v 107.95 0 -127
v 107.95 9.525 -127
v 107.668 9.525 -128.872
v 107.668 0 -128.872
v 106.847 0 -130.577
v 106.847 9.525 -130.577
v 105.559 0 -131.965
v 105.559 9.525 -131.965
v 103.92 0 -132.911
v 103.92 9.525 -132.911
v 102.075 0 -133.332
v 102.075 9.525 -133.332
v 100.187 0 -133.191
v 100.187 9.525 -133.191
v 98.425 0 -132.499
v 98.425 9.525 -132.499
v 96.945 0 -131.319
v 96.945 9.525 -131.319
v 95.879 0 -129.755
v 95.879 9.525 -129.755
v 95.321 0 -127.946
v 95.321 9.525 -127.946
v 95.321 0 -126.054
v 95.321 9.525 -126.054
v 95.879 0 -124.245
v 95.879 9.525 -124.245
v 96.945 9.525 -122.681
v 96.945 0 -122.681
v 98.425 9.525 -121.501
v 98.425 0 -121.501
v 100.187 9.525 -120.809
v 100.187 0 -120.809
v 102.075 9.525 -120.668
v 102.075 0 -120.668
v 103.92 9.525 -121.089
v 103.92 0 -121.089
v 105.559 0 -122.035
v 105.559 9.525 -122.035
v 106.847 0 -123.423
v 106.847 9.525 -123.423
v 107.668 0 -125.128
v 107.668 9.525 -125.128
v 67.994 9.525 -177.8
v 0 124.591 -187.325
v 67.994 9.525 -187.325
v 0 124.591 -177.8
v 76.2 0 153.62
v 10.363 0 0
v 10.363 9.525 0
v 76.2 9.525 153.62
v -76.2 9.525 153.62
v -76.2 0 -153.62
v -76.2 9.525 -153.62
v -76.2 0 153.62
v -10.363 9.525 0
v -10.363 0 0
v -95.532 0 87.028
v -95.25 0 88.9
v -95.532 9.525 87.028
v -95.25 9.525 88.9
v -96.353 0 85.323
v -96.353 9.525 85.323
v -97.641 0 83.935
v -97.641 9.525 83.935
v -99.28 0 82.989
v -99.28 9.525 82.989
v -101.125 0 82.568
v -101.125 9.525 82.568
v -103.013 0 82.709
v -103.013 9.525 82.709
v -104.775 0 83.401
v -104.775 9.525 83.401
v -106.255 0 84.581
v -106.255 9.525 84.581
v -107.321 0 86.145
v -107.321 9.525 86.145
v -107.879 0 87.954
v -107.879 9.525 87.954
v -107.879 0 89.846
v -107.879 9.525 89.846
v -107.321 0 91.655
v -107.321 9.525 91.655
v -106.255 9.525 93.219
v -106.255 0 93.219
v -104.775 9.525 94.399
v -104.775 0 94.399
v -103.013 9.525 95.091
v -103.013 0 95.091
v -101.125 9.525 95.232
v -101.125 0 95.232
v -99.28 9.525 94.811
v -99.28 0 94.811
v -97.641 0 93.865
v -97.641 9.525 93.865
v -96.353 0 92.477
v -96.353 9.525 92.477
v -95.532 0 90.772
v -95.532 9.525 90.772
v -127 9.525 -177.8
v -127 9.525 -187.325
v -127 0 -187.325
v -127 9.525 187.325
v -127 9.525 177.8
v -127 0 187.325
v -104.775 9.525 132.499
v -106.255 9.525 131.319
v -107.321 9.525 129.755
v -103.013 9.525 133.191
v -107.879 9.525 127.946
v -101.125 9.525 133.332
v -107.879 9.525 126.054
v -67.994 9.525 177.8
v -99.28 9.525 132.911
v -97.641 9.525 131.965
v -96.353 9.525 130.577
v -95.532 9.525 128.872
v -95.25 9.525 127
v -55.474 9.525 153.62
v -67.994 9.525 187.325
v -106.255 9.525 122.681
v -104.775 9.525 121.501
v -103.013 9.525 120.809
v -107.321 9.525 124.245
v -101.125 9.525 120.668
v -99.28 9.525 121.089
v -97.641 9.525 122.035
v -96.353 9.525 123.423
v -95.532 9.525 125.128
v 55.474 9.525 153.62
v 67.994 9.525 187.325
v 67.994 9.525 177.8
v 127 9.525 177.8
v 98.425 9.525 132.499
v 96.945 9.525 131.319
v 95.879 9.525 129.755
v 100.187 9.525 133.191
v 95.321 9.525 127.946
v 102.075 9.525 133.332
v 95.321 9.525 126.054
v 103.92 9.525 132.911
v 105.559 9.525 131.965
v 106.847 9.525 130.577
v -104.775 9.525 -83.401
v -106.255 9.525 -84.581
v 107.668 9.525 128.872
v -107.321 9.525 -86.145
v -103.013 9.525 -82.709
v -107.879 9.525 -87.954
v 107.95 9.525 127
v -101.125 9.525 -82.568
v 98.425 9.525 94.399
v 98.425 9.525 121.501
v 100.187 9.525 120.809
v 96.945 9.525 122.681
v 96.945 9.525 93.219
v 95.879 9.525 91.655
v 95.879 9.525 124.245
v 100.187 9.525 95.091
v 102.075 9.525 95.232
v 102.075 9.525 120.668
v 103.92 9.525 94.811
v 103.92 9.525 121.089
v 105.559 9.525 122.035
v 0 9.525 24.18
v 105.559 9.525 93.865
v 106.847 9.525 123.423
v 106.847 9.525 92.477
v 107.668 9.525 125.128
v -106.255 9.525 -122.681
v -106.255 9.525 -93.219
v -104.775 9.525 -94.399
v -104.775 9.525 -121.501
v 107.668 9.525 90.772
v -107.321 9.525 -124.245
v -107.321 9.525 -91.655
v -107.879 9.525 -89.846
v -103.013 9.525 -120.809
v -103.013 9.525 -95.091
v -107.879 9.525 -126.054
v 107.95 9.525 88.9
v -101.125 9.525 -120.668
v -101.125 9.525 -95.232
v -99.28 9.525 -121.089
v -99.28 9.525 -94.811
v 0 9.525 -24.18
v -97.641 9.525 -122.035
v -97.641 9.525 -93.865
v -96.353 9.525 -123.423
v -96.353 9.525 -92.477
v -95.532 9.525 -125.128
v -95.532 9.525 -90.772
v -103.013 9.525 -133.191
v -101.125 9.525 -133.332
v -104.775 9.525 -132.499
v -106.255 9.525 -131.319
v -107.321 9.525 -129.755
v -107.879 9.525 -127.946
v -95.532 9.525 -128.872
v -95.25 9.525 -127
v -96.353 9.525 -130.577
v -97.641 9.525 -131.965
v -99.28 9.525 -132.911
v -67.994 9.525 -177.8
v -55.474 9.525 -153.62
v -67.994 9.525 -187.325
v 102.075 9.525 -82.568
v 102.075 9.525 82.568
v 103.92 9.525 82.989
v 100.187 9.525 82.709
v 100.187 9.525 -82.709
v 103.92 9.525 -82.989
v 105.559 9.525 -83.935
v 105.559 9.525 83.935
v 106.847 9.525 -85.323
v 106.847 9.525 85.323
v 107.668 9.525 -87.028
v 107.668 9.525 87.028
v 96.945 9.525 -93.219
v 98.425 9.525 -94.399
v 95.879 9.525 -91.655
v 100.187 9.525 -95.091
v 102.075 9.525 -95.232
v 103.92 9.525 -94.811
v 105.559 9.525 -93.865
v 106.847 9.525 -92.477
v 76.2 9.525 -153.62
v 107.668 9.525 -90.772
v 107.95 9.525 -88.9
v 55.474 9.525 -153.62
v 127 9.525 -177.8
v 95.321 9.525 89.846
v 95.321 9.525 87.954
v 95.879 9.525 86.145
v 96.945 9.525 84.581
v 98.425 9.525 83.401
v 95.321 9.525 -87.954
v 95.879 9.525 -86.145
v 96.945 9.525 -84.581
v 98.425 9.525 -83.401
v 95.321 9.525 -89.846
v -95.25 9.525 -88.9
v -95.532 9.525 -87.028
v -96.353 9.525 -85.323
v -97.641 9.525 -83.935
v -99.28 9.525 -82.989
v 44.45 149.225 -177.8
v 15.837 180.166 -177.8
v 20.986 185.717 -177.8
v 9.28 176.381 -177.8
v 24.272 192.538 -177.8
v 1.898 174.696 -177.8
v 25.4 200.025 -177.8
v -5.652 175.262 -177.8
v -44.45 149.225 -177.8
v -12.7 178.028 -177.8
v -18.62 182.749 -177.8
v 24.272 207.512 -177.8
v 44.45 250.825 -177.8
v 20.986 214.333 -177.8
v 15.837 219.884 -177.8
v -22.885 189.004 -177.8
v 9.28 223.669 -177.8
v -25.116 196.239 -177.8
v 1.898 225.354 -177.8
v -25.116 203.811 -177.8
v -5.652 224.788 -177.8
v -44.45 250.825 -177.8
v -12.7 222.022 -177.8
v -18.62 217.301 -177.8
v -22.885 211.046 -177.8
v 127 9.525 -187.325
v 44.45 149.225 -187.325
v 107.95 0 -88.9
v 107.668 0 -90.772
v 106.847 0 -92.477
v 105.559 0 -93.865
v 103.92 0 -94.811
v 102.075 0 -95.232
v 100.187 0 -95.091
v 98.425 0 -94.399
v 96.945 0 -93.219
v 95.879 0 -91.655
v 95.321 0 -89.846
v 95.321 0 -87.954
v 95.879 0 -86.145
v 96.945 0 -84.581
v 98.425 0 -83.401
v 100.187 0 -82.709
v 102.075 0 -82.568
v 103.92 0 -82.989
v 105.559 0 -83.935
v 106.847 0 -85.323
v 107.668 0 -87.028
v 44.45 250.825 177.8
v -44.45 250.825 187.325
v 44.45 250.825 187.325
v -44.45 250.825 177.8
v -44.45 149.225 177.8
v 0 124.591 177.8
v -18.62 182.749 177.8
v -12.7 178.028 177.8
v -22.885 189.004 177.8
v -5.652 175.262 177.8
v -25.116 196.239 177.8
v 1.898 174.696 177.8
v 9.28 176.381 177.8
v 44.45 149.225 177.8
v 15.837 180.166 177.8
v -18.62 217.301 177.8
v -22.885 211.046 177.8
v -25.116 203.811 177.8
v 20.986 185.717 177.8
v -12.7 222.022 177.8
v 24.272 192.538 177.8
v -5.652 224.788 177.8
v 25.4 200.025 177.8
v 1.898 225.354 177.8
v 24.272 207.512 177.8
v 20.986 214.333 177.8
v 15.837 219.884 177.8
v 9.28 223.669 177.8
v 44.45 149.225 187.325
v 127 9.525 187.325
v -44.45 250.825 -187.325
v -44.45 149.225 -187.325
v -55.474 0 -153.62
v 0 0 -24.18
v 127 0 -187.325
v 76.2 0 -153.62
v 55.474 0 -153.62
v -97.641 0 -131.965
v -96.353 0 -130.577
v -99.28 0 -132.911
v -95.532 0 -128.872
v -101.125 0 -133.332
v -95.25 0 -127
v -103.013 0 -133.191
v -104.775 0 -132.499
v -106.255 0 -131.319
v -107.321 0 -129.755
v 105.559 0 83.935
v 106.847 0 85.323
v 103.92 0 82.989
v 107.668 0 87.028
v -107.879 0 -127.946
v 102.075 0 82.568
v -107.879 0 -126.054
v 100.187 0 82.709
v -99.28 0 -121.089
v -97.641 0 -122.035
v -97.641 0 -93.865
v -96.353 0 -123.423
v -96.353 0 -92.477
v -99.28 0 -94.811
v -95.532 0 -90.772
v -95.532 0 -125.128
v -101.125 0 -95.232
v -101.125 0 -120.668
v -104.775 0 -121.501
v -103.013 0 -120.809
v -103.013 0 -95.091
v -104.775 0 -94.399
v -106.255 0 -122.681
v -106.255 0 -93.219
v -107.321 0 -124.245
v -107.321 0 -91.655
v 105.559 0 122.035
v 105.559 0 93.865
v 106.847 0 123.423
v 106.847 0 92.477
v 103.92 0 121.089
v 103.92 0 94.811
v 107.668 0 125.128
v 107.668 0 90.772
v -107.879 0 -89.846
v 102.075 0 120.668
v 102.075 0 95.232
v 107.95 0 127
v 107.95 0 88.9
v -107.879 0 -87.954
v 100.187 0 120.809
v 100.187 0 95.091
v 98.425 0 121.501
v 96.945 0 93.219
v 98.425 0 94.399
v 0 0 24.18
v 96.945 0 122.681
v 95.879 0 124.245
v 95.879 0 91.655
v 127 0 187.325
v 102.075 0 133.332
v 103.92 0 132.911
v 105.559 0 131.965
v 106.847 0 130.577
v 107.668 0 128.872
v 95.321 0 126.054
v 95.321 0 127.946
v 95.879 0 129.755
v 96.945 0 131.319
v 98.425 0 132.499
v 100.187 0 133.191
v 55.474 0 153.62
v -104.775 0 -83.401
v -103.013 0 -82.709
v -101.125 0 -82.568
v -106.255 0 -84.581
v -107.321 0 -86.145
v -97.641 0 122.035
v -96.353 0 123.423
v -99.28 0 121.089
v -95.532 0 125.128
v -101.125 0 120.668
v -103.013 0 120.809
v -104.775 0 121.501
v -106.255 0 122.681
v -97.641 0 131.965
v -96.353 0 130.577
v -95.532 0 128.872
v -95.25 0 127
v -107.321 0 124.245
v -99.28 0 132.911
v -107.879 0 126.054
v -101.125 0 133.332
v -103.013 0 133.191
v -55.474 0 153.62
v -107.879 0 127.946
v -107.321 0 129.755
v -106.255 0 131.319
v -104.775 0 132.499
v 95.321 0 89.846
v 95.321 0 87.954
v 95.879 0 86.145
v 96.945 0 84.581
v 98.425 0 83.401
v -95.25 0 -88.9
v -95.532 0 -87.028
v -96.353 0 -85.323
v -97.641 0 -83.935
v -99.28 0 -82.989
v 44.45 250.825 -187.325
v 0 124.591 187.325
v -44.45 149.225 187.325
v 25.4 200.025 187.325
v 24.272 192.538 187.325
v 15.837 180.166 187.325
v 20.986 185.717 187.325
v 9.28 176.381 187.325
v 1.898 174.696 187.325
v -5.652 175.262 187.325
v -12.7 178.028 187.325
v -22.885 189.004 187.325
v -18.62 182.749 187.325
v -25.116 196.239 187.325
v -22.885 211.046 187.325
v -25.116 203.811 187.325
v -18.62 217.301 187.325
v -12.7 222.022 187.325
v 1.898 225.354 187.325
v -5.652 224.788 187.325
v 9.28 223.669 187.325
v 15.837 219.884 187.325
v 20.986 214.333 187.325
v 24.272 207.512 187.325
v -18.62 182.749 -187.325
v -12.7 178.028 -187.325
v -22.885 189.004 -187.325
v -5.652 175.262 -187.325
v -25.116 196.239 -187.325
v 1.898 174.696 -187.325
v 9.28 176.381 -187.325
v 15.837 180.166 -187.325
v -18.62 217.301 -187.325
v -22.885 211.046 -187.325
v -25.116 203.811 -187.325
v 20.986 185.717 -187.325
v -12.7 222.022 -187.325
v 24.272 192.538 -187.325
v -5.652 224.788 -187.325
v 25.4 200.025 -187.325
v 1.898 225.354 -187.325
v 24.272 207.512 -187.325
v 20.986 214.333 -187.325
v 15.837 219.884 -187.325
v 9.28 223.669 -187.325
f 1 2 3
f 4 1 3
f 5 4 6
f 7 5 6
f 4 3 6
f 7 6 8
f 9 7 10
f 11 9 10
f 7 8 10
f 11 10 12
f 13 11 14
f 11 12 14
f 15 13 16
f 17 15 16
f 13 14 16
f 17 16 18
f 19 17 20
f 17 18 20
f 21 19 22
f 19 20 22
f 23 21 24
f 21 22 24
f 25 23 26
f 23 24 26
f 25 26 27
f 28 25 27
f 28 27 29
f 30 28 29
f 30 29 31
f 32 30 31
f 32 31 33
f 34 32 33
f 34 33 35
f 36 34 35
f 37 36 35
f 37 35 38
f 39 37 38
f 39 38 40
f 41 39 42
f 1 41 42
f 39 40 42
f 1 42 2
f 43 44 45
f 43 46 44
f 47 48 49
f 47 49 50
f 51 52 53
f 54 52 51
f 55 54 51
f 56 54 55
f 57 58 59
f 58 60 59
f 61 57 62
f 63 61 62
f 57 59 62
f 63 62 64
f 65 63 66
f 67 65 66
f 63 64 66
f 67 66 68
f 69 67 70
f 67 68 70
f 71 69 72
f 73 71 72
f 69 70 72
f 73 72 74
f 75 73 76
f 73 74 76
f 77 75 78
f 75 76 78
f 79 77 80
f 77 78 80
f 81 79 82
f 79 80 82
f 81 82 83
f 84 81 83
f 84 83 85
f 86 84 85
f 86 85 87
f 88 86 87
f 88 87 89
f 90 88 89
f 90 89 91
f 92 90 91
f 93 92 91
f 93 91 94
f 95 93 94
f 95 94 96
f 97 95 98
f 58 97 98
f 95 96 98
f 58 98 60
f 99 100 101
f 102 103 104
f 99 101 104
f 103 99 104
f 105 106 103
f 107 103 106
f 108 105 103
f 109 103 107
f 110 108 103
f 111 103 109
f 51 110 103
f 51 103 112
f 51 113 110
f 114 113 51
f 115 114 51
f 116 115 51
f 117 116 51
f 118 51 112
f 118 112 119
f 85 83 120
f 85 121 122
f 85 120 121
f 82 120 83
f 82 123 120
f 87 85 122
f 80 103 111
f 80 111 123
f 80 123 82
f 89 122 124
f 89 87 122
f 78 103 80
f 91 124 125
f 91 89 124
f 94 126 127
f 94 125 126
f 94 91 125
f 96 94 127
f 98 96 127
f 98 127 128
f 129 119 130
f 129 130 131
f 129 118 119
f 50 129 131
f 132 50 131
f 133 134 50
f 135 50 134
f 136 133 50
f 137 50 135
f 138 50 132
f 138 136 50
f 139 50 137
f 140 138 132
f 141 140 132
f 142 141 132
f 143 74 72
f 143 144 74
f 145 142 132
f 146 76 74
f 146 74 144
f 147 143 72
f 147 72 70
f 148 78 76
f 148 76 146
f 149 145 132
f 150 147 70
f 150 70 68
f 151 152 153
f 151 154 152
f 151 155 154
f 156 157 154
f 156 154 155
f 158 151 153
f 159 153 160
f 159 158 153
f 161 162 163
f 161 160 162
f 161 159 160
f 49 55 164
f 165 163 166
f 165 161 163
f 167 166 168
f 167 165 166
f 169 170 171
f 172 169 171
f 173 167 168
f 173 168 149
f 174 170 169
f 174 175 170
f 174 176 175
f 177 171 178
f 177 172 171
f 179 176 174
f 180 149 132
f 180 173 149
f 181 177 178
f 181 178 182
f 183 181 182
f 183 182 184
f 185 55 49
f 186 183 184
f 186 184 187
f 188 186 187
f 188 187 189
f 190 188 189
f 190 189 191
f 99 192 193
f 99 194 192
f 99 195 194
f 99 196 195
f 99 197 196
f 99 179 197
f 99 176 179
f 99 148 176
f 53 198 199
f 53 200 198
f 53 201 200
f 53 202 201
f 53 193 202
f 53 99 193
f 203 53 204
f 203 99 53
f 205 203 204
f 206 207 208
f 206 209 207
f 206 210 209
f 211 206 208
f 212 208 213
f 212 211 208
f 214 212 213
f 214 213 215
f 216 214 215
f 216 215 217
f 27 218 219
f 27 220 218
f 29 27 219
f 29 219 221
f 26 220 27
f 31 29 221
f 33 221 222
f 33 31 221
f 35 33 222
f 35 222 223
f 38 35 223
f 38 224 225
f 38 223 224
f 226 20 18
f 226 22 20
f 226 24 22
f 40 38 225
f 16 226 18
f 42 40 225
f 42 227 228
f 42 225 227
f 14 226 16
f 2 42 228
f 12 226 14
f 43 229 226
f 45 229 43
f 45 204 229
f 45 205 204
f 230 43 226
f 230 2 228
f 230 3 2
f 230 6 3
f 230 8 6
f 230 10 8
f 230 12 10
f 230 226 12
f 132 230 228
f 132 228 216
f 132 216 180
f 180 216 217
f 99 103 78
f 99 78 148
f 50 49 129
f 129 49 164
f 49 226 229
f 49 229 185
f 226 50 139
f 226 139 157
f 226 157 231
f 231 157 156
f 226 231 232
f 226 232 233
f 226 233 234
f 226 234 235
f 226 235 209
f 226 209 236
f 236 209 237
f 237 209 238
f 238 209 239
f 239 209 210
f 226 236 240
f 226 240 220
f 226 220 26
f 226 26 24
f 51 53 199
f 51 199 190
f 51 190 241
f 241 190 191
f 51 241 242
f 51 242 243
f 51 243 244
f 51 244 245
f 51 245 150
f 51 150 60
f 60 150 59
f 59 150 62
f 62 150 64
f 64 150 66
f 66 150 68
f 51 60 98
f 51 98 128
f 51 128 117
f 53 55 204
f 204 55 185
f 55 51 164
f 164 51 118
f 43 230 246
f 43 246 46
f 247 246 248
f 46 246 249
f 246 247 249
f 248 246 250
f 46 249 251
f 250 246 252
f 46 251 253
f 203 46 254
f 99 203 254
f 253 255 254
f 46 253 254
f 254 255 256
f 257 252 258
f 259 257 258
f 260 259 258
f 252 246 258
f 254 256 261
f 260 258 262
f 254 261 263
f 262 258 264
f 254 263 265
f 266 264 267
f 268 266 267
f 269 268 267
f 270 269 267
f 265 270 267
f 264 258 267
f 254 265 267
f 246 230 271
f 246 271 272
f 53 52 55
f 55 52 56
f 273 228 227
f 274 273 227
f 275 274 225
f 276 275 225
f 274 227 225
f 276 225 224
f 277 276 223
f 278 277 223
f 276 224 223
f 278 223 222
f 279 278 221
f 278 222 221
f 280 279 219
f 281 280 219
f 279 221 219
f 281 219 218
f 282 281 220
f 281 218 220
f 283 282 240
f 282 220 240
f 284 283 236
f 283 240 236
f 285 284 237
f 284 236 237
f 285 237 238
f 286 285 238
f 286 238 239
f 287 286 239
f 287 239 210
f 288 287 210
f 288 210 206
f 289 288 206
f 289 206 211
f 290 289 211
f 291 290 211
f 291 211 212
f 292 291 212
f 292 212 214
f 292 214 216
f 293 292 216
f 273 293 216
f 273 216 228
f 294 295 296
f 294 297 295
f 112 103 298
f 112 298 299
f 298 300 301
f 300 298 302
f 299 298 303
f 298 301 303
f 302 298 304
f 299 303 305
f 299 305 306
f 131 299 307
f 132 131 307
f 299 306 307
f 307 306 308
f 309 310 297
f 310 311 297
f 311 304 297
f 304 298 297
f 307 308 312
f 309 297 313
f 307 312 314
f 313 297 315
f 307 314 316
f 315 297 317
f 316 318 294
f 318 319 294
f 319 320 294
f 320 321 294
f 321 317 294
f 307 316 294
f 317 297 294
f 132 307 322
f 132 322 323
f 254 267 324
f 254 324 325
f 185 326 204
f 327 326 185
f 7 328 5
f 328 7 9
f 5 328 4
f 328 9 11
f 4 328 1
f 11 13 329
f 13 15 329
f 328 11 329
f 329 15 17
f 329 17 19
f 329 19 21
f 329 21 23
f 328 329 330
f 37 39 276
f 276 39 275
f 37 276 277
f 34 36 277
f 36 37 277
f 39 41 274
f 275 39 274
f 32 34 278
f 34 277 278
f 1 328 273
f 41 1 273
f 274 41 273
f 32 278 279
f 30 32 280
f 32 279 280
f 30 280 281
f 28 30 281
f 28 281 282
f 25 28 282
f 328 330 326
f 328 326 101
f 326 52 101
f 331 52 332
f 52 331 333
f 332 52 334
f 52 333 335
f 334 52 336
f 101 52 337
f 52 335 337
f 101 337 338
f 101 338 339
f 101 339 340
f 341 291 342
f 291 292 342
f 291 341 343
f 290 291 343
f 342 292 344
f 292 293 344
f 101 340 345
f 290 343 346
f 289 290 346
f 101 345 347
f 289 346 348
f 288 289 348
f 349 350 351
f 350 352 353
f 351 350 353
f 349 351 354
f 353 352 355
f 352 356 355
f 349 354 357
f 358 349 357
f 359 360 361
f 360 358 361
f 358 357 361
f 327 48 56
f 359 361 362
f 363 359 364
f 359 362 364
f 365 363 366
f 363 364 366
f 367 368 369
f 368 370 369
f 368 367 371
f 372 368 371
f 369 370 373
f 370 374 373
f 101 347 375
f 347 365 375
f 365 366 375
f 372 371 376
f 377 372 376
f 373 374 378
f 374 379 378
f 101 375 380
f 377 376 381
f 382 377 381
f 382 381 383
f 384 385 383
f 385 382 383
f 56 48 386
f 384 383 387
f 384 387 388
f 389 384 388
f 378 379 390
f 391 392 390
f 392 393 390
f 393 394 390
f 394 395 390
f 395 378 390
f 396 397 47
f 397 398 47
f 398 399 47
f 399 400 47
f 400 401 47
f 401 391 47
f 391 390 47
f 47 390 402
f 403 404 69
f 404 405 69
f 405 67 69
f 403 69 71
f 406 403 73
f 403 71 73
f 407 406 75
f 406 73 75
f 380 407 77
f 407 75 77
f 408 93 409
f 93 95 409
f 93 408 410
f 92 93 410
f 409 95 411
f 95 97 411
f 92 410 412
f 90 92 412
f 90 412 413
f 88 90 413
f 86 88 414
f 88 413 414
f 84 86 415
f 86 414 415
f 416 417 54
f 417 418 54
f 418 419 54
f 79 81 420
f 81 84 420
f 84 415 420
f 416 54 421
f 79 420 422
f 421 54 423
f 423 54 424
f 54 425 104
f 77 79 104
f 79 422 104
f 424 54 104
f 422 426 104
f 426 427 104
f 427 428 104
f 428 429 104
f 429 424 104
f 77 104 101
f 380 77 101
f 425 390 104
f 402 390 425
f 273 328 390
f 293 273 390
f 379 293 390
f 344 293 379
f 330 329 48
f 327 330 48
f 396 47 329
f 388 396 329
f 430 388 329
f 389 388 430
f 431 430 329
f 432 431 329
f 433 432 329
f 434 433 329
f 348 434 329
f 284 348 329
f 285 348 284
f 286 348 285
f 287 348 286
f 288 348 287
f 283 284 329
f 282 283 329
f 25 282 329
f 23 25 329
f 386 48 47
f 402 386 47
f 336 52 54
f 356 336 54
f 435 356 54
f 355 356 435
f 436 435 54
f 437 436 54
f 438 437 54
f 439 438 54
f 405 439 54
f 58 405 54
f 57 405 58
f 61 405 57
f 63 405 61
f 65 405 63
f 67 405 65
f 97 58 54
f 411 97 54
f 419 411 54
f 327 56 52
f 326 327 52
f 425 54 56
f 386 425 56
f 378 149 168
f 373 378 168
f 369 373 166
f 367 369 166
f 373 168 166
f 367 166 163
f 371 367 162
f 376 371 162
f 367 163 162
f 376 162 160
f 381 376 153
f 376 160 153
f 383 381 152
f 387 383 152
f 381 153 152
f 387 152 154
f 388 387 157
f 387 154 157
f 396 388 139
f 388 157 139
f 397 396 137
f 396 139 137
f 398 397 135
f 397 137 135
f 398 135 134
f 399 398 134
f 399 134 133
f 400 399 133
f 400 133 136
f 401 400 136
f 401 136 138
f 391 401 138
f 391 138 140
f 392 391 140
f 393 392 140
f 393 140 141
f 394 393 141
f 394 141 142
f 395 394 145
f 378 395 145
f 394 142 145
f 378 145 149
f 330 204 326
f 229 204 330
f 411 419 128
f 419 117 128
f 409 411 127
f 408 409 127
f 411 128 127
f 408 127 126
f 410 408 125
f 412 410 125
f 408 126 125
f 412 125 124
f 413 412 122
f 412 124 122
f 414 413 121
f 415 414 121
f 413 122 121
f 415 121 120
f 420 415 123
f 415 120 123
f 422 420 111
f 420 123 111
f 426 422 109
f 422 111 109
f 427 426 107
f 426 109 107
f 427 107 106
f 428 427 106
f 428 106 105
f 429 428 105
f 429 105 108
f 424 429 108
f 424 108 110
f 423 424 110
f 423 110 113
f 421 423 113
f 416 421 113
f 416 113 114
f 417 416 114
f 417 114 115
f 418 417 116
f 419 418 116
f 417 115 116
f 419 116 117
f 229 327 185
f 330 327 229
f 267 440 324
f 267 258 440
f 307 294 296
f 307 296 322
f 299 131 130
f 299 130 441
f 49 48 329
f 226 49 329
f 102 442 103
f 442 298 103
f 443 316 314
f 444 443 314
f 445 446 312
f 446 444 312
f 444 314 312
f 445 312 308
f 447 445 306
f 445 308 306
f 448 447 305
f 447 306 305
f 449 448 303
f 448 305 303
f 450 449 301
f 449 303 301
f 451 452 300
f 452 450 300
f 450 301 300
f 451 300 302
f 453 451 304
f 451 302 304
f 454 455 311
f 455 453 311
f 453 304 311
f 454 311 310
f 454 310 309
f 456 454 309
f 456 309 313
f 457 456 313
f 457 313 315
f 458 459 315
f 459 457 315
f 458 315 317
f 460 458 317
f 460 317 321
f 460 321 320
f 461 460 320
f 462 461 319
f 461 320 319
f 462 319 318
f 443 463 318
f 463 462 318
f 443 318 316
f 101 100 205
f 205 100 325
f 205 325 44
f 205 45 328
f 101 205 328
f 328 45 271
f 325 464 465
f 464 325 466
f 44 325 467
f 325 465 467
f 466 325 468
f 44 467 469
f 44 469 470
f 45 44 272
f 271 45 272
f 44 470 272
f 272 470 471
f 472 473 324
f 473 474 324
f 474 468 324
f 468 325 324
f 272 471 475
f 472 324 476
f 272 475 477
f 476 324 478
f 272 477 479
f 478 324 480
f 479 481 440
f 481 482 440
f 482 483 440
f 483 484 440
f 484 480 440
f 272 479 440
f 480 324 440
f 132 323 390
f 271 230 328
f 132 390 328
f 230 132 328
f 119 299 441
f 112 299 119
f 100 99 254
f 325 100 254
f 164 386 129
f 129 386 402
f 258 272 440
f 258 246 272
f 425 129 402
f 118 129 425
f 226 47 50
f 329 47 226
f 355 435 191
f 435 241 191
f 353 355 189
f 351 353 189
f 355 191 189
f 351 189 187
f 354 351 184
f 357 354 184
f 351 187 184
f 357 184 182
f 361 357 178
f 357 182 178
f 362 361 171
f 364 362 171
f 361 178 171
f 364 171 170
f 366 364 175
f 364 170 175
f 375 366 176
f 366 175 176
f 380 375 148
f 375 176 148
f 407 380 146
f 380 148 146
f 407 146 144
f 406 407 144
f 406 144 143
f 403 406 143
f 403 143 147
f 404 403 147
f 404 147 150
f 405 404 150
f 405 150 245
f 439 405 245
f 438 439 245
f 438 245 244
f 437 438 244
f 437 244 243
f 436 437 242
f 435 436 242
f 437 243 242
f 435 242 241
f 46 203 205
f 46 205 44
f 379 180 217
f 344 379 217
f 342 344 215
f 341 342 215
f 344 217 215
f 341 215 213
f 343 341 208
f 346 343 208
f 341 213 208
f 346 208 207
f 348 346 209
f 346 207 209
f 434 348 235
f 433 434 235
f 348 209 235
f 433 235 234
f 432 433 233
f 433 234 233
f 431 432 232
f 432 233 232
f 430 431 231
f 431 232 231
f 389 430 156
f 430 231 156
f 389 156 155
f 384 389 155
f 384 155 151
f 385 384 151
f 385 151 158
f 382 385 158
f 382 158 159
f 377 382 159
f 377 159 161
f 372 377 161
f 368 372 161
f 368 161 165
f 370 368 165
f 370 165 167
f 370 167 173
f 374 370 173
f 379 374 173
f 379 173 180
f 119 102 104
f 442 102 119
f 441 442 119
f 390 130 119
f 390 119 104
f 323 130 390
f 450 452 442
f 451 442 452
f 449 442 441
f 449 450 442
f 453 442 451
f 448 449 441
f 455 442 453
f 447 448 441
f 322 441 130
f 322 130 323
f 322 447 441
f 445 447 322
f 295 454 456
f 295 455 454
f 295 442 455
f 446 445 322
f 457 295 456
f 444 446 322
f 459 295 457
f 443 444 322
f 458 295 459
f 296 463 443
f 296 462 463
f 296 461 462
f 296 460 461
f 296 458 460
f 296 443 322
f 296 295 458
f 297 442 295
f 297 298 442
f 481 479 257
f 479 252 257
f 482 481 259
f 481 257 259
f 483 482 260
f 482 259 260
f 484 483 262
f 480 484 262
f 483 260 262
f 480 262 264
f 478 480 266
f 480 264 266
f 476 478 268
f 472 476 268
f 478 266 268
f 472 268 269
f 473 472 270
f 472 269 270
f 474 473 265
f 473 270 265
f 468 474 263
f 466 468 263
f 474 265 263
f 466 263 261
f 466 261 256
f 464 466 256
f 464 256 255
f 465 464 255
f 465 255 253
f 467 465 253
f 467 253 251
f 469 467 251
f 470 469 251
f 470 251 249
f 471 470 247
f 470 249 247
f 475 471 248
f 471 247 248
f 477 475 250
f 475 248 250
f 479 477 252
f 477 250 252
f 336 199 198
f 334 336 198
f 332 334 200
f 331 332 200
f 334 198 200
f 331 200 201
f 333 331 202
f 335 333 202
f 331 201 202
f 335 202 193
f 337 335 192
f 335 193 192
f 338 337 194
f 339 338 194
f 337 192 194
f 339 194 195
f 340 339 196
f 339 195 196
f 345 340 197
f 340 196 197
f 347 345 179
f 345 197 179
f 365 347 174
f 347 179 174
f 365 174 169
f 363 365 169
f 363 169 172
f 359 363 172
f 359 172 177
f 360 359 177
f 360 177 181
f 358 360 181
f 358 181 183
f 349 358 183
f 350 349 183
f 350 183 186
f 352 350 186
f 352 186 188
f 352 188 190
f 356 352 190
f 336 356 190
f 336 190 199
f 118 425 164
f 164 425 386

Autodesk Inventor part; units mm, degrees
ref_plane "YZ Plane" through (0, 0, 0) normal (1, 0, 0) x (0, 1, 0)
ref_plane "XZ Plane" through (0, 0, 0) normal (0, 1, 0) x (-1, 0, 0)
sketch "Sketch1" plane through (0, 0, 0) normal (0, 1, 0) x (-1, 0, 0)
  line L0 (-127, 228.6) -> (-127, -228.6)
  line L1 (-65.8371, -177.8) -> (65.8371, -177.8)
  line L2 (127, -228.6) -> (127, 228.6)
  line L3 (65.8371, 177.8) -> (-65.8371, 177.8)
  line L4 (127, -228.6) -> (-127, -228.6)
  line L5 (-127, 228.6) -> (127, 228.6)
  line L6 (-76.2, 153.6199) -> (-76.2, -153.6199)
  line L7 (76.2, -153.6199) -> (76.2, 153.6199)
  line L8 (76.2, -153.6199) -> (10.3629, 0)
  line L9 (0, 24.1801) -> (-65.8371, 177.8)
  line L10 (65.8371, -177.8) -> (0, -24.1801)
  line L11 (-10.3629, 0) -> (-76.2, 153.6199)
  line L12 (76.2, 153.6199) -> (10.3629, 0)
  line L13 (0, -24.1801) -> (-65.8371, -177.8)
  line L14 (65.8371, 177.8) -> (0, 24.1801)
  line L15 (-10.3629, 0) -> (-76.2, -153.6199)
  point P0 (0, 0)
  point P1 (-127, 155.9501)
  point P2 (127, -155.9501)
  point P3 (-127, -155.9501)
  point P4 (127, 155.9501)
extrude "Extrusion3" add sketch "Sketch1" along normal blind 9.525
sketch "Sketch7" plane through (0, 9.525, 0) normal (0, 1, 0) x (1, 0, 0)
  line L0 (0, 24.1801) -> (-65.8371, 177.8) projected
  line L1 (-127, 228.6) -> (-127, -228.6) projected
  line L2 (-76.2, 153.6199) -> (-76.2, -153.6199) projected
  circle A0 centre (-101.6, 127) radius 6.35
  circle A1 centre (-101.6, 88.9) radius 6.35
  line L3 (127, 228.6) -> (-127, 228.6) projected
  line L4 (-127, -228.6) -> (127, -228.6) projected
  circle A2 centre (101.6, 127) radius 6.35
  circle A3 centre (101.6, 88.9) radius 6.35
  line L5 (127, -228.6) -> (127, 228.6) projected
  circle A4 centre (-101.6, -127) radius 6.35
  circle A5 centre (-101.6, -88.9) radius 6.35
  circle A6 centre (101.6, -127) radius 6.35
  circle A7 centre (101.6, -88.9) radius 6.35
  point P0 (0, 0)
extrude "Extrusion4" cut sketch "Sketch7" against normal up to next contours A0 | A1 | A2 | A3 | A4 | A5 | A6 | A7
sketch "Sketch8" plane through (127, 0, -228.6) normal (0, 0, -1) x (-1, 0, 0)
  point P0 (127, 0)
ref_plane "Work Plane2" through (0, 0, 177.8) normal (0, 0, 1) x (1, 0, 0)
mirror "Mirror3" about plane through (0, 0, 0) normal (0, 0, 1)
sketch "Sketch13" plane through (0, 0, 177.8) normal (0, 0, 1) x (1, 0, 0)
  line L0 (0, 0) -> (0, 9.525) projected
  line L1 (-127, 9.525) -> (127, 9.525) projected
  line L2 (0, 9.525) -> (-44.45, 9.525)
  line L3 (-44.45, 250.825) -> (44.45, 250.825)
  circle A0 centre (0, 200.025) radius 25.4
  line L4 (-127, 0) -> (-127, 9.525) projected
  line L5 (-44.45, 149.225) -> (-127, 9.525)
  line L6 (127, 0) -> (127, 9.525) projected
  line L7 (44.45, 149.225) -> (127, 9.525)
  line L8 (67.9938, 9.525) -> (0, 124.5914)
  line L9 (0, 124.5914) -> (-67.9938, 9.525)
  line L10 (44.45, 250.825) -> (44.45, 149.225)
  line L11 (-44.45, 149.225) -> (-44.45, 250.825)
  dimension "d52" = 88.9
  dimension "d56" = 50.8
  dimension "d57" = 50.8
extrude "Extrusion8" add sketch "Sketch13" along normal blind 9.525 contours L5 L11 L3 L10 L7 L1 L8 L9
mirror "Mirror4" about plane through (0, 0, 0) normal (0, 0, 1) of "Extrusion8"
sketch "Sketch14" plane through (0, 9.525, 0) normal (0, 1, 0) x (1, 0, 0)
  line L0 (-127, 228.6) -> (-127, 187.325) projected
  line L1 (67.9938, 187.325) -> (127, 187.325) projected
  line L2 (-127, 228.6) -> (127, 228.6)
  line L3 (127, 228.6) -> (127, 187.325)
  line L4 (127, 187.325) -> (-127, 187.325)
  line L5 (-127, 187.325) -> (-127, 228.6)
  line L6 (-44.45, -187.325) -> (-127, -187.325) projected
  line L7 (-127, -228.6) -> (127, -228.6) projected
  line L8 (-127, -187.325) -> (127, -187.325)
  line L9 (127, -187.325) -> (127, -228.6)
  line L10 (127, -228.6) -> (-127, -228.6)
  line L11 (-127, -228.6) -> (-127, -187.325)
  point P0 (0, 0)
extrude "Extrusion9" cut sketch "Sketch14" against normal blind 25.4
sketch "Sketch15" plane through (0, 9.525, 0) normal (0, 1, 0) x (1, 0, 0)
  line L0 (-76.2, 153.6199) -> (-10.3629, 0) projected
  line L1 (-76.2, 153.6199) -> (76.2, 153.6199)
  line L2 (76.2, 153.6199) -> (76.2, 177.8)
  line L3 (127, 177.8) -> (44.45, 177.8) projected
  line L4 (-76.2, 153.6199) -> (-76.2, 177.8)
  line L5 (-76.2, 177.8) -> (76.2, 177.8)
  line L6 (-44.45, -177.8) -> (-127, -177.8) projected
  line L7 (-76.2, -177.8) -> (76.2, -177.8)
  line L8 (76.2, -177.8) -> (76.2, -152.9852)
  line L9 (76.2, -152.9852) -> (-76.2, -152.9852)
  line L10 (-76.2, -152.9852) -> (-76.2, -177.8)
  point P0 (0, 0)
extrude "Extrusion10" add sketch "Sketch15" against normal blind 9.525 contours L4 L5 L3 L2 L1
sketch "Sketch16" plane through (0, 9.525, 0) normal (0, 1, 0) x (1, 0, 0)
  line L0 (-76.2, -153.6199) -> (-10.3629, 0) projected
  line L1 (-76.2, -153.6199) -> (-76.2, -177.8)
  line L2 (-127, -177.8) -> (-67.9938, -177.8) projected
  line L3 (76.2, -153.6199) -> (76.2, 153.6199) projected
  line L4 (76.2, -153.6199) -> (-76.2, -153.6199)
  line L5 (-76.2, -153.6199) -> (-76.2, -177.8)
  line L6 (-76.2, -177.8) -> (76.2, -177.8)
  line L7 (76.2, -177.8) -> (76.2, -153.6199)
  point P0 (0, 0)
extrude "Extrusion11" add sketch "Sketch16" against normal blind 9.525
ref_plane "Work Plane3" through (0, 0, 0) normal (0, 0, 1) x (1, 0, 0)
properties part number "Square Support"
